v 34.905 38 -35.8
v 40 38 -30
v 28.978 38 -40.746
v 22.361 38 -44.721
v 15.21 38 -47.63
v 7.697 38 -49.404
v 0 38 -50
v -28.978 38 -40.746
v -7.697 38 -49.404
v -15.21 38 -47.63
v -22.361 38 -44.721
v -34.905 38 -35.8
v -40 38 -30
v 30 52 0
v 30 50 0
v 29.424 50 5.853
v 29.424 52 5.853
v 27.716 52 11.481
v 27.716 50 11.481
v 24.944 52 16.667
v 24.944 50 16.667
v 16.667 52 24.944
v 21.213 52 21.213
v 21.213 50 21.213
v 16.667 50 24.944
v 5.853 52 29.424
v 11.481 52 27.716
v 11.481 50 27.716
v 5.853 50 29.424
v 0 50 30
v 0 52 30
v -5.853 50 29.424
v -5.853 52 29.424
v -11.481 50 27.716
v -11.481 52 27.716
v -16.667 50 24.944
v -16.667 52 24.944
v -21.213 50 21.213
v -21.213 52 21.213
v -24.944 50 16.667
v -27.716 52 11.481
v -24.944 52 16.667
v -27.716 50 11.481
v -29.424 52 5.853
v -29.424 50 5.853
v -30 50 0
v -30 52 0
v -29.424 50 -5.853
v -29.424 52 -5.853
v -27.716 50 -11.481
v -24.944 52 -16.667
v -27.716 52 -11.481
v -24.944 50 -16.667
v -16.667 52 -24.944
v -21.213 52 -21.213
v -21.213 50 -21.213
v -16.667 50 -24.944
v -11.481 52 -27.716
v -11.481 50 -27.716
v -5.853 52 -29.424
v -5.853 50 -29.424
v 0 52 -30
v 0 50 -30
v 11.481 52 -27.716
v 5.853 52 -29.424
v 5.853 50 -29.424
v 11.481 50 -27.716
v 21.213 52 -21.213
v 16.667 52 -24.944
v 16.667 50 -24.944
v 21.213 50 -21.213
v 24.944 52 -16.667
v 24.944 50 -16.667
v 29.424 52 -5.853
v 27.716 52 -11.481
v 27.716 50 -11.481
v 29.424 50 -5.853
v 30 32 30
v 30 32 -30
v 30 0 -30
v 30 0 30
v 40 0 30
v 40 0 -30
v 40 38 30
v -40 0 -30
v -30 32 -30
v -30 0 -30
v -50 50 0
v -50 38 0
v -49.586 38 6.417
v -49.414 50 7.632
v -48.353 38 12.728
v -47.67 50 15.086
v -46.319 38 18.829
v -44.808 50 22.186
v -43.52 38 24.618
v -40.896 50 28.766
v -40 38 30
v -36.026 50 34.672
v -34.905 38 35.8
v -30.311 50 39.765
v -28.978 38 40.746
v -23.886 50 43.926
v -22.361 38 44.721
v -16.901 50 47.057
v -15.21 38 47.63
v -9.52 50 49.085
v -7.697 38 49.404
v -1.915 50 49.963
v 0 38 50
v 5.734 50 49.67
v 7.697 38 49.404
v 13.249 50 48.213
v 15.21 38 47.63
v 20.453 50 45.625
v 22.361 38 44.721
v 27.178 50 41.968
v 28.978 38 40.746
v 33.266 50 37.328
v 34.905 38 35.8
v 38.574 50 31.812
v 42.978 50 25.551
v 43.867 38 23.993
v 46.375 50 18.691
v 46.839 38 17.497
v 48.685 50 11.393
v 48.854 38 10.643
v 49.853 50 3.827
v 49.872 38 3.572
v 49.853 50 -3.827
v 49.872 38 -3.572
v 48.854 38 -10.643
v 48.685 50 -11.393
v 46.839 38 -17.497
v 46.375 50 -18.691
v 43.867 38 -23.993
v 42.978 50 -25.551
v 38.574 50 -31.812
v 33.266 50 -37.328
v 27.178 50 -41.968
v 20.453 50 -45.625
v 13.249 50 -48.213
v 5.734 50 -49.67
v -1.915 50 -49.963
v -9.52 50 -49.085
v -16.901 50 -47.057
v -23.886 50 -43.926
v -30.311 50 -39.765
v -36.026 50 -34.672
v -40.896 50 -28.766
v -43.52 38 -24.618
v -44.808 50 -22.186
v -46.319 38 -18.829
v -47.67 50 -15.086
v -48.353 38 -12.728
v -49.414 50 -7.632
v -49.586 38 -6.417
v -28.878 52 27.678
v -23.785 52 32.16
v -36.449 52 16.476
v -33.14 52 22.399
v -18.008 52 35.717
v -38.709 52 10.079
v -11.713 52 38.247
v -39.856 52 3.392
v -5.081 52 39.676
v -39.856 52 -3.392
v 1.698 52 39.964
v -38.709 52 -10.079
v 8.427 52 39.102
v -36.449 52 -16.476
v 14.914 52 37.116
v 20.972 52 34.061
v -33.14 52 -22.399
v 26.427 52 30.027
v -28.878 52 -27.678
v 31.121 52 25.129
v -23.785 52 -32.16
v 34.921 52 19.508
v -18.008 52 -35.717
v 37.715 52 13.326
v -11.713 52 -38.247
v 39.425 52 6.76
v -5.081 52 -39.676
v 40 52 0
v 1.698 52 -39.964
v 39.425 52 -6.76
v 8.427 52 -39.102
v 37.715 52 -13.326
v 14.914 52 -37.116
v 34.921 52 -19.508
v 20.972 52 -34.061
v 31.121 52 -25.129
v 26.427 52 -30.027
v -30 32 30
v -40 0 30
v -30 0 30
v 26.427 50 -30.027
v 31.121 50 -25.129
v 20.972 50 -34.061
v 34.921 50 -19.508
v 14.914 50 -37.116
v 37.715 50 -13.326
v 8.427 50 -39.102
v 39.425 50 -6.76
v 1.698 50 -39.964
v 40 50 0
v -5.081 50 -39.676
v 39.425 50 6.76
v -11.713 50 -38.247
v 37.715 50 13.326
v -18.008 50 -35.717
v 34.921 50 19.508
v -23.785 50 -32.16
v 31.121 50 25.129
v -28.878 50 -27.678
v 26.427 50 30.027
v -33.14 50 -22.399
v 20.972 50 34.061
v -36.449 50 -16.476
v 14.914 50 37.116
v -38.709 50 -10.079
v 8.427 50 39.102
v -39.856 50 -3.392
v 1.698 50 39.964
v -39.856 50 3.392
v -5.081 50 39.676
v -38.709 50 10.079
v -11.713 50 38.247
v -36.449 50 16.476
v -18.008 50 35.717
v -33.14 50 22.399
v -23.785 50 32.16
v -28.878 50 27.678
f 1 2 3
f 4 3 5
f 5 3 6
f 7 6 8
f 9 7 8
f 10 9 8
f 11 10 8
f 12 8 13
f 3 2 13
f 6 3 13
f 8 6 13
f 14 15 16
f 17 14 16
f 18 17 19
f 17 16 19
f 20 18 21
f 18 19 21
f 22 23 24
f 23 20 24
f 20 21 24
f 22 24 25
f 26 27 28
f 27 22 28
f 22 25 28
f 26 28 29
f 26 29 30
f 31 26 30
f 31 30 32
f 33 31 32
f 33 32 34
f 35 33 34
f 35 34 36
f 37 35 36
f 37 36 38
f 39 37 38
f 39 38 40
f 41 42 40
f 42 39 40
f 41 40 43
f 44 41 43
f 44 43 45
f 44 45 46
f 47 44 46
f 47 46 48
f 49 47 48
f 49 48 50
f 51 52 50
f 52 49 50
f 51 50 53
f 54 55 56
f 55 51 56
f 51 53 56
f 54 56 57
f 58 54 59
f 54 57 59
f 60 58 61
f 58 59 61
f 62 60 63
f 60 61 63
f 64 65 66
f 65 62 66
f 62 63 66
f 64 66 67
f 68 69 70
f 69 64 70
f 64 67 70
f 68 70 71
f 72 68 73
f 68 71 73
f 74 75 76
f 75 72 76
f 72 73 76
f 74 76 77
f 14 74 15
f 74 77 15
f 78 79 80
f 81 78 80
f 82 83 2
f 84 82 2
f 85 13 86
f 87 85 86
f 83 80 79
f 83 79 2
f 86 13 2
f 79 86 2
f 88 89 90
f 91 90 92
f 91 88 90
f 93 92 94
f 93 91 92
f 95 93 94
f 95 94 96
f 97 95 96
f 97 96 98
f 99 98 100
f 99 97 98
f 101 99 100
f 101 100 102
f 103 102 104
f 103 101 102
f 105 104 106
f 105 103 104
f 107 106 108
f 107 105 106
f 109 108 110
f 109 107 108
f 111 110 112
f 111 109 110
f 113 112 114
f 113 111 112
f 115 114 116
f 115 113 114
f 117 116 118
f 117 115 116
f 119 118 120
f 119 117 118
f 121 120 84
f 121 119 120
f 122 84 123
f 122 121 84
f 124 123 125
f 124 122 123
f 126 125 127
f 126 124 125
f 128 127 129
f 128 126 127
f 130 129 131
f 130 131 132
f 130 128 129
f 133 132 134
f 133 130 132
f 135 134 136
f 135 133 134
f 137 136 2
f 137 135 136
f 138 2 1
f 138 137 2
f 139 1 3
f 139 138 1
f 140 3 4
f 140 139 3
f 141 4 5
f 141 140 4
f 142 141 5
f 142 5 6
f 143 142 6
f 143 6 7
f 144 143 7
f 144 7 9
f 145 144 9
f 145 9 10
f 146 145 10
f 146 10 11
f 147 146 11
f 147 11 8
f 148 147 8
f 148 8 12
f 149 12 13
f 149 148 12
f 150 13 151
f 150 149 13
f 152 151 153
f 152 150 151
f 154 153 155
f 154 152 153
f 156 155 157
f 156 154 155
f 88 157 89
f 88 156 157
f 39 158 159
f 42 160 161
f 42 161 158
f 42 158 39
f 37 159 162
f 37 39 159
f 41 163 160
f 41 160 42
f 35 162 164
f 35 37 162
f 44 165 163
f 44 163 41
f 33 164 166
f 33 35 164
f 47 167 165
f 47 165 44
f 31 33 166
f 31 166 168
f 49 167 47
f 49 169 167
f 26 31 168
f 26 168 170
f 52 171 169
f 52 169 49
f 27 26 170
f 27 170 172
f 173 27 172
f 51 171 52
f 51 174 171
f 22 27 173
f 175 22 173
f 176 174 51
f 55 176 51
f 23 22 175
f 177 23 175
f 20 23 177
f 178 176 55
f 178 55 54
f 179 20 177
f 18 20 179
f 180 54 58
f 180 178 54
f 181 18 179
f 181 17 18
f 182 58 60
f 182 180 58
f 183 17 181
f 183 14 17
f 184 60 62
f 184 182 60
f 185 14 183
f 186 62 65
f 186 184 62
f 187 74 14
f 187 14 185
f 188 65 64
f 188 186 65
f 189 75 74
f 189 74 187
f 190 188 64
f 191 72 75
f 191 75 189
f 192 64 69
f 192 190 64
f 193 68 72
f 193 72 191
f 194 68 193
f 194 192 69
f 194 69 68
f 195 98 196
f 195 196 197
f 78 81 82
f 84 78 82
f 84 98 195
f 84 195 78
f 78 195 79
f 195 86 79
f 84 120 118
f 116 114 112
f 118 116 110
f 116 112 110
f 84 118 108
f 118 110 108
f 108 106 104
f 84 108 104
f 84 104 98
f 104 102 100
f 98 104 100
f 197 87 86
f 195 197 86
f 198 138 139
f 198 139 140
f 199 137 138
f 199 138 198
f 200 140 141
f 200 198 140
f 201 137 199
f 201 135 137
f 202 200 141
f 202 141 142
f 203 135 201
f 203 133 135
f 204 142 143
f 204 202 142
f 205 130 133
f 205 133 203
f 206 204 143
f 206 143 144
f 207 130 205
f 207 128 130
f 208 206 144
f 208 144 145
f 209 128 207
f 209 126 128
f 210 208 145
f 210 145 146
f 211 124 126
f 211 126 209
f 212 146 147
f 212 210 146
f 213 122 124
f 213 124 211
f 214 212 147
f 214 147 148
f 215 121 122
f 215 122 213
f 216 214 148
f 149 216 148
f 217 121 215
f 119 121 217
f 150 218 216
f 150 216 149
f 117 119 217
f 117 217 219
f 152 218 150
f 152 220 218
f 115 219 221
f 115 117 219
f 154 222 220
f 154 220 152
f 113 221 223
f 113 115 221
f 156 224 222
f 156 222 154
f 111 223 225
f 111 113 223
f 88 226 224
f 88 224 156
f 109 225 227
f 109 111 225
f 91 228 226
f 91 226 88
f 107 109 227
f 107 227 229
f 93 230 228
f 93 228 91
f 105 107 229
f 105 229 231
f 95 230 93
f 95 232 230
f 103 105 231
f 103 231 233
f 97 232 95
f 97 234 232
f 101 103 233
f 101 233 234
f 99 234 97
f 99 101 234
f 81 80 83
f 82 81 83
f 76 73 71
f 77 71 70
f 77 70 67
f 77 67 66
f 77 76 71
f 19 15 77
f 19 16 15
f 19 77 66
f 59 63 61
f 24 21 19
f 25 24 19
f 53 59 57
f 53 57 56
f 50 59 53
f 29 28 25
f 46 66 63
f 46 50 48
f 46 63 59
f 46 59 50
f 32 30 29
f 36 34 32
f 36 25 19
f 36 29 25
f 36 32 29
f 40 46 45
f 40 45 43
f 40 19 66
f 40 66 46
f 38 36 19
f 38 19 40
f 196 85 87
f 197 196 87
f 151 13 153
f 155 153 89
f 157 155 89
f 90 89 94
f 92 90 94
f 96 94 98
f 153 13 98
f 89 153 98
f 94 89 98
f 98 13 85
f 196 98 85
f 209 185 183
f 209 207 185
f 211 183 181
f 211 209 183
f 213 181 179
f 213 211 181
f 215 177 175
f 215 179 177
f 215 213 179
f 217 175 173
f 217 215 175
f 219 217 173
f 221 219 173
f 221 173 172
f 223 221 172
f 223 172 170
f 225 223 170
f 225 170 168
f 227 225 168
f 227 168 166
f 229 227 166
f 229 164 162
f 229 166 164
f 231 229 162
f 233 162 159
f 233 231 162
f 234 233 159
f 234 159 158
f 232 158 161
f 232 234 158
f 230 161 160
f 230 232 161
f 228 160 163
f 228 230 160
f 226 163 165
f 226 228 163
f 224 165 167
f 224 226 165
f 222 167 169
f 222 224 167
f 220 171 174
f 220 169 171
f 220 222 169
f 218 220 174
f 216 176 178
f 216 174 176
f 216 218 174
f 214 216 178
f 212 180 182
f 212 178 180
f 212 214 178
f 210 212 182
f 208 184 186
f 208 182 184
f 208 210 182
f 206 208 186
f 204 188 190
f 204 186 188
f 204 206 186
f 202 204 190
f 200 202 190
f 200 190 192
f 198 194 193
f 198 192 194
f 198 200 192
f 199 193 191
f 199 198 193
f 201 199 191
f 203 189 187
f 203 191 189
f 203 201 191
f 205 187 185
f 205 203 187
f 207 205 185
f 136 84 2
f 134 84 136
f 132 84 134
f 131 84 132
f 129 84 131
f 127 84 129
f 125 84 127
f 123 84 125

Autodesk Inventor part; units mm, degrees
ref_plane "Work Plane1" through (0, 50, 0) normal (0, 1, 0) x (-1, 0, 0)
sketch "Sketch1" plane through (0, 50, 0) normal (0, 1, 0) x (-1, 0, 0)
  circle A0 centre (0, 0) radius 50
  dimension "d11" = 100
extrude "Extrusion1" add sketch "Sketch1" against normal blind 12
sketch "Sketch2" plane through (0, 0, 0) normal (0, 0, 1) x (1, 0, 0)
  line L0 (-40, 38) -> (40, 38) projected
  line L1 (-40, 50) -> (-40, 38) projected
  line L2 (-40, 38) -> (-40, 0)
  line L3 (-40, 0) -> (-30, 0)
  line L4 (-30, 0) -> (-30, 32)
  line L5 (-30, 32) -> (30, 32)
  line L6 (30, 32) -> (30, 0)
  line L7 (30, 0) -> (40, 0)
  line L8 (40, 50) -> (40, 38) projected
  line L9 (40, 0) -> (40, 38)
  point P0 (0, 0)
  dimension "d5" = 10
  dimension "d6" = 32
  dimension "d7" = 60
  dimension "d8" = 10
extrude "Extrusion2" add sketch "Sketch2" along normal mid plane 60
sketch "Sketch3" plane through (0, 50, 0) normal (0, 1, 0) x (1, 0, 0)
  circle A0 centre (0, 0) radius 40
  circle A1 centre (0, 0) radius 30
  dimension "d12" = 80
  dimension "d15" = 60
extrude "Extrusion3" add sketch "Sketch3" along normal blind 2
properties part number "Z5" material "Steel, Alloy"
